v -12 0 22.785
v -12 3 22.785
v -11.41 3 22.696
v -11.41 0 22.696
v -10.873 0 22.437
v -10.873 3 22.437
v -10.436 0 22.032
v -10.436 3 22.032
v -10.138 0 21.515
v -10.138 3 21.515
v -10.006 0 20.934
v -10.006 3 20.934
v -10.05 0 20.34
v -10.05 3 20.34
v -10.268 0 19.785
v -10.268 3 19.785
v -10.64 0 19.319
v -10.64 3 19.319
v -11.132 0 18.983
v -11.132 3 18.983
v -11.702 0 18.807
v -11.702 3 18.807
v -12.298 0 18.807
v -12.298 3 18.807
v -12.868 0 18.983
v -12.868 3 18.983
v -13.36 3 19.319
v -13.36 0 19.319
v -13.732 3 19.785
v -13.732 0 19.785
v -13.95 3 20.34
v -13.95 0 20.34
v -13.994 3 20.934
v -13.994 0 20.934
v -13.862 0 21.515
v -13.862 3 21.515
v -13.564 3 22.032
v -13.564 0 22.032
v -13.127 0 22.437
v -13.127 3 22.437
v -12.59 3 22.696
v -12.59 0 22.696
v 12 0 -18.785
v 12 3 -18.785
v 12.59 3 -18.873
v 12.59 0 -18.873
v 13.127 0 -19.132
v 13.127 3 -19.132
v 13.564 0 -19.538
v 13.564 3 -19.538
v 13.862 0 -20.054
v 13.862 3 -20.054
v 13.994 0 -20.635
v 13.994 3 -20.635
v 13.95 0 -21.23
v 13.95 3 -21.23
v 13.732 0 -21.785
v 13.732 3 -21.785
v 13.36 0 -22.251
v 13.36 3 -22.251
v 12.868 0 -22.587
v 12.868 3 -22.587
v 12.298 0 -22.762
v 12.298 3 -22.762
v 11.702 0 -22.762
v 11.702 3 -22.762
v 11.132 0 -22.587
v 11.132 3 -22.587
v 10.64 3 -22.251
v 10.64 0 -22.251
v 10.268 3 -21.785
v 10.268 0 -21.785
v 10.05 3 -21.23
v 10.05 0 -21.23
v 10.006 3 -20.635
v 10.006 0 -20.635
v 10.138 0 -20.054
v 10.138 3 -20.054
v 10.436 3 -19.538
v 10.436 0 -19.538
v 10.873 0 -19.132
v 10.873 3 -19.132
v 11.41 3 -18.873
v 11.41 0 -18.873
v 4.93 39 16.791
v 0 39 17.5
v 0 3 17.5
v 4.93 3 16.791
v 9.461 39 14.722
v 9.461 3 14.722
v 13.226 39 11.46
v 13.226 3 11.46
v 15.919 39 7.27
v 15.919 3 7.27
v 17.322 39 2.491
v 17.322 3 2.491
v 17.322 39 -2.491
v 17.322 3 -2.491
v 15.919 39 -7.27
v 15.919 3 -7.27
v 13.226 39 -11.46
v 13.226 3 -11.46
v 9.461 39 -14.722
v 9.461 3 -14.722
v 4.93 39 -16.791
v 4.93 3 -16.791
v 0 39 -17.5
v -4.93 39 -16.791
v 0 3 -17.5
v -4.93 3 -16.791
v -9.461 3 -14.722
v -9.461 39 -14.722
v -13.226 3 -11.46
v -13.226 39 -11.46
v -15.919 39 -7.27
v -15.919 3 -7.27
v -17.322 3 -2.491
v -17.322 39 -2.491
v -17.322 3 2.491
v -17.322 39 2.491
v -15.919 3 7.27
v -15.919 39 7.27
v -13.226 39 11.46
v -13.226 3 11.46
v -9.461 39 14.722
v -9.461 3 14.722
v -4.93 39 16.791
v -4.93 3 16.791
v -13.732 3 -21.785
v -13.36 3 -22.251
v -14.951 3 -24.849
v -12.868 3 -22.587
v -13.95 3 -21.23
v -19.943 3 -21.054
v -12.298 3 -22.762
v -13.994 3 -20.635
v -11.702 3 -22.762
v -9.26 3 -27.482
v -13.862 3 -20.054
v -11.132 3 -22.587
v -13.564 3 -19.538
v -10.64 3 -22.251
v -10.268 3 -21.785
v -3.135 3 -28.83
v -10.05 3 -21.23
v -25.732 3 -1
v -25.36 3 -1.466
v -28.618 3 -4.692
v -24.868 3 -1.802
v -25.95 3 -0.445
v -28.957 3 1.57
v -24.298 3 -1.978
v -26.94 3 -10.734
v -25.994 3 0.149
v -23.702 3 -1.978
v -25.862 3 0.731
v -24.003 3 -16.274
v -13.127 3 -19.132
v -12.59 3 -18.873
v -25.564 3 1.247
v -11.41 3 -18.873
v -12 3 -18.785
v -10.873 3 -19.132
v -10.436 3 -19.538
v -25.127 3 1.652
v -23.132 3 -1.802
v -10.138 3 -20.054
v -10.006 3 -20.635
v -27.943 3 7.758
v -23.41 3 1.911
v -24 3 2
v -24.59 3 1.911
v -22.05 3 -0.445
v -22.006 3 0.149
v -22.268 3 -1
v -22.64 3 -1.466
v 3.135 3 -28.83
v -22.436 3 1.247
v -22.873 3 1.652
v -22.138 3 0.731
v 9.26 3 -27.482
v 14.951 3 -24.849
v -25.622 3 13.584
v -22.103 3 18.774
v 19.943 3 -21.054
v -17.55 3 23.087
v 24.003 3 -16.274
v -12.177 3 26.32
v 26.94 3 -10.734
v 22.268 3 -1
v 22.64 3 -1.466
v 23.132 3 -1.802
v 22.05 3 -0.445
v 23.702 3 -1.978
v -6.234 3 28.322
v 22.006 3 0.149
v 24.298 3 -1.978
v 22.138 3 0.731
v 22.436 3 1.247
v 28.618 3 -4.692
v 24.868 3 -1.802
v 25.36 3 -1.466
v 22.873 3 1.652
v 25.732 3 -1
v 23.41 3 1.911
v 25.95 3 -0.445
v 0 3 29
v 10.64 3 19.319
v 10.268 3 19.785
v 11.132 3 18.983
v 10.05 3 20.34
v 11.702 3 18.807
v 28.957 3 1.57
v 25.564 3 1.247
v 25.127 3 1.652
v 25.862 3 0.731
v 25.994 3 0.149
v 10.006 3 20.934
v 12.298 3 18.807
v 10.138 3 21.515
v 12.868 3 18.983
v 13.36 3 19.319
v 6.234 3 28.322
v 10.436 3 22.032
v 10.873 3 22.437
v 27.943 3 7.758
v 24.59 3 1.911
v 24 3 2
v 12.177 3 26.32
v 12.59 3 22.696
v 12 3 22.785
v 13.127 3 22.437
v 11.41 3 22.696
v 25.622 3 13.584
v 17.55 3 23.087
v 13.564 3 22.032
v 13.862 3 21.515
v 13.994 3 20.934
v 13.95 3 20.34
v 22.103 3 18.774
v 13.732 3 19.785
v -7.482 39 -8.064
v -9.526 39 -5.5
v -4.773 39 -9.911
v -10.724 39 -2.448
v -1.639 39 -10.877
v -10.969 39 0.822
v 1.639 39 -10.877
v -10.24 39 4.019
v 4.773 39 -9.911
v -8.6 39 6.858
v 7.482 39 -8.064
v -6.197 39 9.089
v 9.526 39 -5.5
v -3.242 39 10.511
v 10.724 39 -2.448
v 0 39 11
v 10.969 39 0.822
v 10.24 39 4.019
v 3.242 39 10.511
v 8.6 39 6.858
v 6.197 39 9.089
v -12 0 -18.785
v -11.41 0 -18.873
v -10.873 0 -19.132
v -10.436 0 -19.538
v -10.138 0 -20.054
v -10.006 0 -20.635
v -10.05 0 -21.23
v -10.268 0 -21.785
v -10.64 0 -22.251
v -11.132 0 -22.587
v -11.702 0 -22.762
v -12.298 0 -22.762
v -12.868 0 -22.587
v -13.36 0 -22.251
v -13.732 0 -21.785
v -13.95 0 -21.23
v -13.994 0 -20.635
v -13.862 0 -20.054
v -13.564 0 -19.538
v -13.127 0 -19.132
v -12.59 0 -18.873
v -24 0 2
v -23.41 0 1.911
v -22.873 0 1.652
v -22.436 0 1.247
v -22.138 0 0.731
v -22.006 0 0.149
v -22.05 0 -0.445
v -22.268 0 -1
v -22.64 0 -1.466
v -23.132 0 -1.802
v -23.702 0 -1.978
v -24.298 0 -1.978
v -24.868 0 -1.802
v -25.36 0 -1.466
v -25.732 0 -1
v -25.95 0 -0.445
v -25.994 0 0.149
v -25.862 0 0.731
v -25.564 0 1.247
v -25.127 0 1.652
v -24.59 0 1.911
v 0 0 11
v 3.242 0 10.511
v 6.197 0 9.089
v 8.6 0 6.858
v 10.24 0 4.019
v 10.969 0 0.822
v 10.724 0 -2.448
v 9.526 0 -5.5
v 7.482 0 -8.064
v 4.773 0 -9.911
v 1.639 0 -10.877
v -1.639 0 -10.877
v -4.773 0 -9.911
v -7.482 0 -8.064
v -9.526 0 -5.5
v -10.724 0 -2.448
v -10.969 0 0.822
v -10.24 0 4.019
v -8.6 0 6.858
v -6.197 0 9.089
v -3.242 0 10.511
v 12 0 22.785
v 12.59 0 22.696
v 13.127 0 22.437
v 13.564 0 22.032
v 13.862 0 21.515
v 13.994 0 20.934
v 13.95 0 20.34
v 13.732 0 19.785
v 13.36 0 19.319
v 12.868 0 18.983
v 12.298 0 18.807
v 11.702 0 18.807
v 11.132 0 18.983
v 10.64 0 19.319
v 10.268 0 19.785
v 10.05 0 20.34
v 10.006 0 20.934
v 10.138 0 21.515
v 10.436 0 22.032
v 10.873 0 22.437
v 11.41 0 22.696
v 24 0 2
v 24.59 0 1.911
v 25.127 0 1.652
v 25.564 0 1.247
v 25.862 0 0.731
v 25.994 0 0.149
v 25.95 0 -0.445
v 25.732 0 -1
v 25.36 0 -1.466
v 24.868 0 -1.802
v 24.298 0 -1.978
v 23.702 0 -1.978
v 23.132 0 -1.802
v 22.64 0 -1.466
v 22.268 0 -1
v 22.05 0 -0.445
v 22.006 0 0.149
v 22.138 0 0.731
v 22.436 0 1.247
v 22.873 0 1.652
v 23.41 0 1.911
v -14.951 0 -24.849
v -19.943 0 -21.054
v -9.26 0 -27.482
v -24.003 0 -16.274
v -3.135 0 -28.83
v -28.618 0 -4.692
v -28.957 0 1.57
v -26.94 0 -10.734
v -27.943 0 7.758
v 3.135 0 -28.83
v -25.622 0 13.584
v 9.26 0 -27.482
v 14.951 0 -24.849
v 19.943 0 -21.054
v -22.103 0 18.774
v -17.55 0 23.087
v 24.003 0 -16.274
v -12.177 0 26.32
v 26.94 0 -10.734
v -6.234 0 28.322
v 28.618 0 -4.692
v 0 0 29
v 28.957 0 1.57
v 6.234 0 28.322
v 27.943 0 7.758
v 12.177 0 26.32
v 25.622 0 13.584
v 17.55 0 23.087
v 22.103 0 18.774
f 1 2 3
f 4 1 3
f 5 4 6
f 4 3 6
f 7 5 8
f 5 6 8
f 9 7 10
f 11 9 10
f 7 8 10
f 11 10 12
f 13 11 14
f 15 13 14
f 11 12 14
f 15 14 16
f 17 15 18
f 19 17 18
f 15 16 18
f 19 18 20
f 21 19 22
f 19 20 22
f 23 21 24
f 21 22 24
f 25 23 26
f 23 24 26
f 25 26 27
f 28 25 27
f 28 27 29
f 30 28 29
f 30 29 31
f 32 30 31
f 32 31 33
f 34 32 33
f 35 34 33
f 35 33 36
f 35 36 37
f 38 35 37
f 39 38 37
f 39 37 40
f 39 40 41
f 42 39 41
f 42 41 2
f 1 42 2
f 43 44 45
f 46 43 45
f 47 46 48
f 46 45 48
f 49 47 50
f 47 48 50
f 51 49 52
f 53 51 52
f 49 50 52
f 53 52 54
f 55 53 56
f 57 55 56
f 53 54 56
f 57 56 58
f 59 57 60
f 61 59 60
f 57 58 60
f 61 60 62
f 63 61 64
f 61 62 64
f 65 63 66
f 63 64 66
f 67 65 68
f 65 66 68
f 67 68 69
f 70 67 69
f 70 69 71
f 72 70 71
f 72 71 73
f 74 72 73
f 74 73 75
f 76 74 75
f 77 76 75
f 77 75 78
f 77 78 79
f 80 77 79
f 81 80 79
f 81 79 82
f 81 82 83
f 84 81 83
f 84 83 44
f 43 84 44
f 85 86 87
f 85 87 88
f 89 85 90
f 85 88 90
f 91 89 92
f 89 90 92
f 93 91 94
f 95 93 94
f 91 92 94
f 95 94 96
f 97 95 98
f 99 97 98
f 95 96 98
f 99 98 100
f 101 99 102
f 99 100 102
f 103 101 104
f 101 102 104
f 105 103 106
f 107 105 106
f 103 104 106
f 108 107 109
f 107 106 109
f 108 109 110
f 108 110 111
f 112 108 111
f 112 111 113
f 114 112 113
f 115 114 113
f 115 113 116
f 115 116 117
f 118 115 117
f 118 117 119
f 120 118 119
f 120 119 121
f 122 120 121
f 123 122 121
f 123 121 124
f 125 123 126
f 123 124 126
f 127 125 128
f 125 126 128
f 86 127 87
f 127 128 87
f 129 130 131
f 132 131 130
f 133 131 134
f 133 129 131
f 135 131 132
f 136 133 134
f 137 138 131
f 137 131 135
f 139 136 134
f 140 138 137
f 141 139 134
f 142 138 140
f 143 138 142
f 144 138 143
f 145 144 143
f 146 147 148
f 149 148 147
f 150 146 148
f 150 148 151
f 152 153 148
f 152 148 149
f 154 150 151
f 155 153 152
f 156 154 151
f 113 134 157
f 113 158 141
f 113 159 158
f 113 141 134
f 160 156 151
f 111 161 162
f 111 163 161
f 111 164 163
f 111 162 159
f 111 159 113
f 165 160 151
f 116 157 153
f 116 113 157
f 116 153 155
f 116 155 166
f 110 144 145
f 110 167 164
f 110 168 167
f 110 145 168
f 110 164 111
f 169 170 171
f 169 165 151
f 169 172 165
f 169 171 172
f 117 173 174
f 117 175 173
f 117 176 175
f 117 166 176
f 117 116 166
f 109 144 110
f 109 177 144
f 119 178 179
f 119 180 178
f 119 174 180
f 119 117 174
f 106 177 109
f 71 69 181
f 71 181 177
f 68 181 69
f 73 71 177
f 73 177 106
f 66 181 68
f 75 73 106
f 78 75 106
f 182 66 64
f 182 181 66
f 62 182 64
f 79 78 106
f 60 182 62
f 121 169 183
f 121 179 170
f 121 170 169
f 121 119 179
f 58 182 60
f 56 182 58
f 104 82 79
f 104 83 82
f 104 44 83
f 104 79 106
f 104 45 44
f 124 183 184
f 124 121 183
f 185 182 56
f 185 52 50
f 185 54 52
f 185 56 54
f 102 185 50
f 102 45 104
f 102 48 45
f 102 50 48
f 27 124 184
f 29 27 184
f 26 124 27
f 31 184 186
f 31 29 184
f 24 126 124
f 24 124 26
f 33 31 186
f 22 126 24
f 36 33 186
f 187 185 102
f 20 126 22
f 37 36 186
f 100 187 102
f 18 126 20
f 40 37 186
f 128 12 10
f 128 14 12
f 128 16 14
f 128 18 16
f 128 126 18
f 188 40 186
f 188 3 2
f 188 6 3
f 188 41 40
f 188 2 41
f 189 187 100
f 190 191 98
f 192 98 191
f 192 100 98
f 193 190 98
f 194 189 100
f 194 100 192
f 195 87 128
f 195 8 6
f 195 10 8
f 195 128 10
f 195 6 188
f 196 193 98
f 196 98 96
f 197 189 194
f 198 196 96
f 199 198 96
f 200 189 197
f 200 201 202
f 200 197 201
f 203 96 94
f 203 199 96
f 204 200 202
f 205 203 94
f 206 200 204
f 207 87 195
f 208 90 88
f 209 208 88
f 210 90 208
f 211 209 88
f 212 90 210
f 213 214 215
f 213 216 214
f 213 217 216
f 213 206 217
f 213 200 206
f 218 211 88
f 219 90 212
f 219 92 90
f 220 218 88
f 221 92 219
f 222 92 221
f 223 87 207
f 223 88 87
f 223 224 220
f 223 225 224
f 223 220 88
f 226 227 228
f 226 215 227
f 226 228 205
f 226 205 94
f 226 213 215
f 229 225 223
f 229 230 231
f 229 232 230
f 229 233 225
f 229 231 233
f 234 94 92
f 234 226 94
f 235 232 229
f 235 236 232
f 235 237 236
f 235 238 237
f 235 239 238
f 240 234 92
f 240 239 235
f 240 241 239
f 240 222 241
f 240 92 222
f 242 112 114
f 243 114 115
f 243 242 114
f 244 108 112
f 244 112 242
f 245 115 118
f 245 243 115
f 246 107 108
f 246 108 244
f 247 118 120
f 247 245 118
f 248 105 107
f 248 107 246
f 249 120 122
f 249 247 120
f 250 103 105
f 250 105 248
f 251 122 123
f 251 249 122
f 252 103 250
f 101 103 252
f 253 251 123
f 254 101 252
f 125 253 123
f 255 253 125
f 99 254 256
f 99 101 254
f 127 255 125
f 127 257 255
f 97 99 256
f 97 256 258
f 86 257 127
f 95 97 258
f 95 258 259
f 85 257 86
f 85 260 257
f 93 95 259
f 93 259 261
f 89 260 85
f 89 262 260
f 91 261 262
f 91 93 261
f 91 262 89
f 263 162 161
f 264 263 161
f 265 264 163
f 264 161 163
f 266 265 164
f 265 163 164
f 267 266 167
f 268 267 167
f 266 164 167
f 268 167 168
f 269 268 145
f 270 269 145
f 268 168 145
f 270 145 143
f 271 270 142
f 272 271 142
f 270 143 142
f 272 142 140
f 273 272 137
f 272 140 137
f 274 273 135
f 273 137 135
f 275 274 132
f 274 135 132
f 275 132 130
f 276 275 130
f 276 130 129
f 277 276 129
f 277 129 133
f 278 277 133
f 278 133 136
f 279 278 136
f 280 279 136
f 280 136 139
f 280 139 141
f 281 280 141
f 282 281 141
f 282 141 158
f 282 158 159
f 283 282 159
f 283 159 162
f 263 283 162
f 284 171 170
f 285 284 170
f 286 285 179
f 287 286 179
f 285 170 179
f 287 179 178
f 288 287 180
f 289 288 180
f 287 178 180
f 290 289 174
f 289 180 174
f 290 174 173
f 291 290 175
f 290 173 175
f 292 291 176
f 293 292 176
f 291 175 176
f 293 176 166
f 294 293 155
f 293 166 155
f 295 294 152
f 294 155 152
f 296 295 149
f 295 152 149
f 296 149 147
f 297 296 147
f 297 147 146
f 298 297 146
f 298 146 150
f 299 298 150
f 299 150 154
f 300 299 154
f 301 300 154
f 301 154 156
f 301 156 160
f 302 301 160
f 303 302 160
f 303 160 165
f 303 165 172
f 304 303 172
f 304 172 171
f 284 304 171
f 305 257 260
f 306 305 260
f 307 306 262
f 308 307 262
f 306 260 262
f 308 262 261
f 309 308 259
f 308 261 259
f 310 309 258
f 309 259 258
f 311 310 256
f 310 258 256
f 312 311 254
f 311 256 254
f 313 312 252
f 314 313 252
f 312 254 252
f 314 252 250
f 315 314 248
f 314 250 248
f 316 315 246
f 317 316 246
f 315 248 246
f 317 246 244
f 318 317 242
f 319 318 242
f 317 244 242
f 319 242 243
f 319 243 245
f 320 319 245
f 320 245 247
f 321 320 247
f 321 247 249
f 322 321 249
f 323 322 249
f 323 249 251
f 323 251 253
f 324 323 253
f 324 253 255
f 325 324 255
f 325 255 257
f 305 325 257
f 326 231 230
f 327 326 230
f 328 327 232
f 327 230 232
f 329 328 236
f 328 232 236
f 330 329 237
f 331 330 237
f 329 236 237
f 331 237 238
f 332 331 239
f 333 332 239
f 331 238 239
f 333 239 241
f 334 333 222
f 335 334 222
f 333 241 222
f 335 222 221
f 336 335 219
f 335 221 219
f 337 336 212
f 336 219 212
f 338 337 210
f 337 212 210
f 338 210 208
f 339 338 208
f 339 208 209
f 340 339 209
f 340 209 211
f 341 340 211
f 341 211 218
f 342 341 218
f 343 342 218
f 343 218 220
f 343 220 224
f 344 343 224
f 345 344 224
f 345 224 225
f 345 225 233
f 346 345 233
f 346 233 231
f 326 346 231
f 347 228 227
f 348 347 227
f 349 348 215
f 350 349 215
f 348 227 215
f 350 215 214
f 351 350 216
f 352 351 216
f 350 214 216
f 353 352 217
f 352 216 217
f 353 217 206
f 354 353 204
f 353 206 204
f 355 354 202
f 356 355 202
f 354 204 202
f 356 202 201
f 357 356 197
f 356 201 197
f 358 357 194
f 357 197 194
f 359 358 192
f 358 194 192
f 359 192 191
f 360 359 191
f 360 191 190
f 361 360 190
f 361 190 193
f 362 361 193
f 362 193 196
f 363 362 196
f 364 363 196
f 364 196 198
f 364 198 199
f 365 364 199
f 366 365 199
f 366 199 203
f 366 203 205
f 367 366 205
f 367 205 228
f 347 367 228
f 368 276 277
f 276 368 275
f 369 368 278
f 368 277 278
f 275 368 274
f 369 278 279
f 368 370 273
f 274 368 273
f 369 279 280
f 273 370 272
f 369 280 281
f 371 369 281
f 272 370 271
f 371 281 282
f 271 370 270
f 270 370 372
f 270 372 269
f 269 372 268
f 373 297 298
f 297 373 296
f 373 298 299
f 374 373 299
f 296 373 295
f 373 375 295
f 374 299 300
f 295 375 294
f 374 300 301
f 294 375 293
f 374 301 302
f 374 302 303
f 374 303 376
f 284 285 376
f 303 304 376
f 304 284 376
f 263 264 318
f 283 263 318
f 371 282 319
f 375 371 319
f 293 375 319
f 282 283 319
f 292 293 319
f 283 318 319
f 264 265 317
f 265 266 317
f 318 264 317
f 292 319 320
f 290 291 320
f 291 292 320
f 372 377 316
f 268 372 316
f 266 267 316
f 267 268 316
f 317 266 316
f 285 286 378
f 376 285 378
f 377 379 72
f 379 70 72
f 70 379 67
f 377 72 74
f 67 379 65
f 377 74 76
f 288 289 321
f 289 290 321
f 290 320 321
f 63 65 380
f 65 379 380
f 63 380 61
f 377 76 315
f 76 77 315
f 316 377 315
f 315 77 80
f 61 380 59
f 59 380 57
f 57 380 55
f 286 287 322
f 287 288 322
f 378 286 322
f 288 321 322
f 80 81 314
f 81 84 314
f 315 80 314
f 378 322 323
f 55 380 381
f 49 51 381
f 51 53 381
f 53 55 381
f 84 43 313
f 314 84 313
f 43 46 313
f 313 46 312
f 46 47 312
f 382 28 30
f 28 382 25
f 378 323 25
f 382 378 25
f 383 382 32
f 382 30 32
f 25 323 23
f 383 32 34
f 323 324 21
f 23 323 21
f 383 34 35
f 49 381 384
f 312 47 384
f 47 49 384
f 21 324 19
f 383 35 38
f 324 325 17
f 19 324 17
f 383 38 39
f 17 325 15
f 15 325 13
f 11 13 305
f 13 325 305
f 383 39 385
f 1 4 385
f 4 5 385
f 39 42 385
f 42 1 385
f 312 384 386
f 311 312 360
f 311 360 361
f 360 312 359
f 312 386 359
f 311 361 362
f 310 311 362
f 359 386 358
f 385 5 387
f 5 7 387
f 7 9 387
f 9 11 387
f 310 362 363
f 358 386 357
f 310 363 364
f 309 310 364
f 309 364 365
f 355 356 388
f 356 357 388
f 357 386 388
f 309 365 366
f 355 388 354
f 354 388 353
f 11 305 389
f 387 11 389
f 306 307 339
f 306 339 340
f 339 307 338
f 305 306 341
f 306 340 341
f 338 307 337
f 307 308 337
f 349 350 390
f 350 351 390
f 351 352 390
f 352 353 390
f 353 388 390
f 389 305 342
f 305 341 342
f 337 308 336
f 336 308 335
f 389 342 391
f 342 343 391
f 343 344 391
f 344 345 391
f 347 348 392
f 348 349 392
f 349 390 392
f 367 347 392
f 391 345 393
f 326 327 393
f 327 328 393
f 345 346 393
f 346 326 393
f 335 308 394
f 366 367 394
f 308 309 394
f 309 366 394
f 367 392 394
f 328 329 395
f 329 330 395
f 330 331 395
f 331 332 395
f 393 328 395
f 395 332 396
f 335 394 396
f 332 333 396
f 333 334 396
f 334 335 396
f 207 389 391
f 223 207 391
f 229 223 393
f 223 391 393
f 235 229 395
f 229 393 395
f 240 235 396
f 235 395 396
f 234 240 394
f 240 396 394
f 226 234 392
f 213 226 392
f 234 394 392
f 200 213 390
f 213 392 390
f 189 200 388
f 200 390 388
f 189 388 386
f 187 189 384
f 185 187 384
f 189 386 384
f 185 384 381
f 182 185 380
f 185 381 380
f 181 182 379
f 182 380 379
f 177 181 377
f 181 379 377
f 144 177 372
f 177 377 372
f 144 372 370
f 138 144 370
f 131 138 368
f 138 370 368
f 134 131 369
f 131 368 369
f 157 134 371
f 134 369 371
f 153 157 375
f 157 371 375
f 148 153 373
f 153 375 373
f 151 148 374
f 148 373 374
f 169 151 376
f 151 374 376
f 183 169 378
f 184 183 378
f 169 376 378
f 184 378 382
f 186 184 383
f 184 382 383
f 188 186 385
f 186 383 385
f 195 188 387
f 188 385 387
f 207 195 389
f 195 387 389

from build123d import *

# Parameters (mm, degrees)
SKETCH_1_R          = 29
EXTRUDE_1_DEPTH     = 3
SKETCH_3_R          = 17.5
EXTRUDE_2_DEPTH     = 36
SKETCH_4_R          = 11
CUT_EXTRUDE_2_DEPTH = 57.595052787
SKETCH_5_R          = 2
CUT_EXTRUDE_3_DEPTH = 10


with BuildPart() as part:
    # 草图1 → 凸台-拉伸1 (new body)
    with BuildSketch(Plane(origin=(0, 0, 0), x_dir=(1, 0, 0), z_dir=(0, 1, 0))):
        with Locations(Location((0, 0, 0), (0, 0, 270))):
            Circle(SKETCH_1_R)
    extrude(amount=EXTRUDE_1_DEPTH)

    # 草图3 → 凸台-拉伸2 (add)
    with BuildSketch(Plane(origin=(0, 3, 0), x_dir=(1, 0, 0), z_dir=(0, 1, 0))):
        with Locations(Location((0, 0, 0), (0, 0, 270))):
            Circle(SKETCH_3_R)
    extrude(amount=EXTRUDE_2_DEPTH)

    # 草图4 → 切除-拉伸2 (cut, through all)
    with BuildSketch(Plane(origin=(0, 39, 0), x_dir=(1, 0, 0), z_dir=(0, 1, 0))):
        with Locations(Location((0, 0, 0), (0, 0, 270))):
            Circle(SKETCH_4_R)
    extrude(amount=-CUT_EXTRUDE_2_DEPTH, mode=Mode.SUBTRACT)

    # 草图5 → 切除-拉伸3 (cut)
    with BuildSketch(Plane(origin=(0, 3, 0), x_dir=(1, 0, 0), z_dir=(0, 1, 0))):
        with Locations(Location((24, 0, 0), (0, 0, 270))):
            Circle(SKETCH_5_R)
        with Locations(Location((12, -20.784609691, 0), (0, 0, 270))):
            Circle(SKETCH_5_R)
        with Locations(Location((-12, -20.784609691, 0), (0, 0, 270))):
            Circle(SKETCH_5_R)
        with Locations(Location((-24, 0, 0), (0, 0, 270))):
            Circle(SKETCH_5_R)
        with Locations(Location((-12, 20.784609691, 0), (0, 0, 270))):
            Circle(SKETCH_5_R)
        with Locations(Location((12, 20.784609691, 0), (0, 0, 270))):
            Circle(SKETCH_5_R)
    extrude(amount=-CUT_EXTRUDE_3_DEPTH, mode=Mode.SUBTRACT)


solid = part.part
